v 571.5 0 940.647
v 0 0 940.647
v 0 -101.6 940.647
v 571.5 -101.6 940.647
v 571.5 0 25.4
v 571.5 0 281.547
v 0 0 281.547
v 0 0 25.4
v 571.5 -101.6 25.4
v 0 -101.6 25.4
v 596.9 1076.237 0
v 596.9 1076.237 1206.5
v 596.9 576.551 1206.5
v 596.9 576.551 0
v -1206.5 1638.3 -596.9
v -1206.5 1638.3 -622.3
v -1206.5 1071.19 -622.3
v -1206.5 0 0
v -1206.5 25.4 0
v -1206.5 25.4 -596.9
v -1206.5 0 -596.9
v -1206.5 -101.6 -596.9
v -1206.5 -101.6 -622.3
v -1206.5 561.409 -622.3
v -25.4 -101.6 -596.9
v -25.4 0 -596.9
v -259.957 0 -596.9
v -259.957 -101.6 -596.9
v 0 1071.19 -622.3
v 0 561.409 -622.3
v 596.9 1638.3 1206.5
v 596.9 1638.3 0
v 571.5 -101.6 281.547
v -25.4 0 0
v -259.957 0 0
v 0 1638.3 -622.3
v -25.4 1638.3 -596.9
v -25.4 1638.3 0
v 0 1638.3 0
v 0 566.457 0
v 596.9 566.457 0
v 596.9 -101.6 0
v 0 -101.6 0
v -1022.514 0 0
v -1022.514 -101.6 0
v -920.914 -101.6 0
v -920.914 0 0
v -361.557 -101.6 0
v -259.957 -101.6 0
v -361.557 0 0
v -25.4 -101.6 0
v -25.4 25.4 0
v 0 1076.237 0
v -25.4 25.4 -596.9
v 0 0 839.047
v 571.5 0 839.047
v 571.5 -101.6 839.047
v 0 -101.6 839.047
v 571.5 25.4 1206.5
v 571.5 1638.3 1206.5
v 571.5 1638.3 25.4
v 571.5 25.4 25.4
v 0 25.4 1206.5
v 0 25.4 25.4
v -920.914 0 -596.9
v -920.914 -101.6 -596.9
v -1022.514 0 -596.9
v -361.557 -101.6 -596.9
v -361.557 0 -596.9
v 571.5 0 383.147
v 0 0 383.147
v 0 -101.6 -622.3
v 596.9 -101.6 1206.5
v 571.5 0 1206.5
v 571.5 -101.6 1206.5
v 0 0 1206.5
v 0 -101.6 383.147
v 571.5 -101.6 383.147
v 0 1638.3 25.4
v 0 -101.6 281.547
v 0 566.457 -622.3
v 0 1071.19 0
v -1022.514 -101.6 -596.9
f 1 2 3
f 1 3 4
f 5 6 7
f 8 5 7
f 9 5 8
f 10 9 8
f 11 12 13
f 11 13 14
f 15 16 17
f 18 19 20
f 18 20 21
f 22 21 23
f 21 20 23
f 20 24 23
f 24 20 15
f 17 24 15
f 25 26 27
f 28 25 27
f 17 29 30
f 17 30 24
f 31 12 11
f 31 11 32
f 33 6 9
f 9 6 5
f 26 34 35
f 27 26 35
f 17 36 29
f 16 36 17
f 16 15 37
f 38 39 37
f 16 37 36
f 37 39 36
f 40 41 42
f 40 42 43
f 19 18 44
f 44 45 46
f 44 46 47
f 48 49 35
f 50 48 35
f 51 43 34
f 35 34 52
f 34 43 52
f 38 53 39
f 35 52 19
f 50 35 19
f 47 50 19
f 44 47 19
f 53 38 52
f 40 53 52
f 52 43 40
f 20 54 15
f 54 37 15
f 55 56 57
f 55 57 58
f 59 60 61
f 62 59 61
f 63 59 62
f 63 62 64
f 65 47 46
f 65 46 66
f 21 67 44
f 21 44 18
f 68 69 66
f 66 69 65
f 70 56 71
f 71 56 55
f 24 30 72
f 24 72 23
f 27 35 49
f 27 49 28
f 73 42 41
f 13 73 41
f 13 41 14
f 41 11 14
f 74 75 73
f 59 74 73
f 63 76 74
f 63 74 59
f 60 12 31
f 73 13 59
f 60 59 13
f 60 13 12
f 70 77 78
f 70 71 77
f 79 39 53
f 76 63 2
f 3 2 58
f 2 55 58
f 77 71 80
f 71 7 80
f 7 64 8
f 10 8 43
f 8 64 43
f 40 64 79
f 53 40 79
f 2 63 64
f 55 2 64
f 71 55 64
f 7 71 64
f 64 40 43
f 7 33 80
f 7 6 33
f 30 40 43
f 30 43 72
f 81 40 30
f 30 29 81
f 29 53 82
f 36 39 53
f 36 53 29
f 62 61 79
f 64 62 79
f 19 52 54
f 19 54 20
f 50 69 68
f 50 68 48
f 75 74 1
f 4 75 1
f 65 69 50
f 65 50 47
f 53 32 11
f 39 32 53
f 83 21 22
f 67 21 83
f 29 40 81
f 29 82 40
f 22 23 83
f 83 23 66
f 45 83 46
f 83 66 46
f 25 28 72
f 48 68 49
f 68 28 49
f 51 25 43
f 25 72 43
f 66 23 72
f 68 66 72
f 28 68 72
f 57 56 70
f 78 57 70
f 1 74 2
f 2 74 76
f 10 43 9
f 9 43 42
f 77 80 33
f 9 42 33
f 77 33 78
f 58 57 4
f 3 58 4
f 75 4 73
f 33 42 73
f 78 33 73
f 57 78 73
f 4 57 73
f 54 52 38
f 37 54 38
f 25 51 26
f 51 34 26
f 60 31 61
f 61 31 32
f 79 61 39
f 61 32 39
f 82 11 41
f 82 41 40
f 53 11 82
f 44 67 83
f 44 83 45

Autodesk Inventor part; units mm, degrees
ref_plane "YZ Plane" through (0, 0, 0) normal (1, 0, 0) x (0, 1, 0)
ref_plane "XZ Plane" through (0, 0, 0) normal (0, 1, 0) x (-1, 0, 0)
ref_plane "XY Plane" through (0, 0, 0) normal (0, 0, 1) x (1, 0, 0)
sketch "Sketch1" plane through (0, 0, 0) normal (0, 1, 0) x (-1, 0, 0)
  line L0 (0, 0) -> (1206.5, 0)
  line L1 (1206.5, 0) -> (1206.5, -596.9)
  line L2 (1206.5, -596.9) -> (0, -596.9)
  line L3 (0, -596.9) -> (0, 0)
  line L4 (0, 0) -> (-596.9, 0)
  line L5 (-596.9, 0) -> (-596.9, 1206.5)
  line L6 (-596.9, 1206.5) -> (0, 1206.5)
  line L7 (0, 1206.5) -> (0, 0)
  dimension "d0" = 1206.5
  dimension "d1" = 596.9
  dimension "d2" = 596.9
  dimension "d3" = 1206.5
extrude "Extrusion1" add sketch "Sketch1" along normal blind 25.4
sketch "Sketch2" plane through (0, 0, 0) normal (1, 0, 0) x (0, 1, 0)
  line L0 (0, 0) -> (1638.3, 0)
  line L1 (1638.3, 0) -> (1638.3, -618.6638)
  line L2 (1638.3, -618.6638) -> (0, -618.6638)
  line L3 (0, -618.6638) -> (0, 0)
  dimension "d6" = 1638.3
extrude "Extrusion2" add sketch "Sketch2" against normal blind 25.4
sketch "Sketch3" plane through (596.9, 0, 1206.5) normal (1, 0, 0) x (0, 0, -1)
  line L0 (0, 0) -> (1206.5, 0) projected
  line L1 (1206.5, 0) -> (1206.5, 25.4) projected
  line L2 (0, 25.4) -> (1206.5, 25.4) projected
  line L3 (0, 0) -> (0, 25.4) projected
  line L4 (0, 0) -> (1206.5, 0)
  line L5 (1206.5, 0) -> (1206.5, 1638.3)
  line L6 (1206.5, 1638.3) -> (0, 1638.3)
  line L7 (0, 1638.3) -> (0, 0)
  dimension "d9" = 1638.3
extrude "Extrusion3" add sketch "Sketch3" against normal blind 25.4 contours L7 L6 L5 L2
sketch "Sketch4" plane through (596.9, 0, 0) normal (0, 0, -1) x (-1, 0, 0)
  line L0 (0, 0) -> (596.9, 0) projected
  line L1 (596.9, 0) -> (596.9, 25.4) projected
  line L2 (25.4, 25.4) -> (596.9, 25.4) projected
  line L3 (25.4, 1638.3) -> (25.4, 25.4) projected
  line L4 (0, 1638.3) -> (25.4, 1638.3) projected
  line L5 (0, 0) -> (0, 1638.3) projected
  line L6 (0, 1638.3) -> (596.9, 1638.3)
  line L7 (596.9, 1638.3) -> (596.9, 0)
  line L8 (596.9, 0) -> (0, 0)
  line L9 (0, 0) -> (0, 1638.3)
extrude "Extrusion4" add sketch "Sketch4" against normal blind 25.4 contours L2 L3 L6 L7
sketch "Sketch5" plane through (-1206.5, 0, -596.9) normal (0, 0, -1) x (-1, 0, 0)
  line L0 (-1181.1, 25.4) -> (-1181.1, 0) projected
  line L1 (-1181.1, 0) -> (0, 0) projected
  line L2 (0, 0) -> (0, 25.4) projected
  line L3 (-1181.1, 25.4) -> (0, 25.4) projected
  line L4 (-1206.5, 0) -> (0, 0)
  line L5 (0, 0) -> (0, 1638.3)
  line L6 (0, 1638.3) -> (-1206.5, 1638.3)
  line L7 (-1206.5, 1638.3) -> (-1206.5, 0)
  dimension "d14" = 1638.3
extrude "Extrusion5" add sketch "Sketch5" along normal blind 25.4 contours L0 L4 L7 L6 L5 L3
sketch "Sketch6" plane through (0, 0, 0) normal (0, -1, 0) x (1, 0, 0)
  line L0 (0, 0) -> (0, 1206.5) projected
  line L1 (596.9, 1206.5) -> (596.9, 0) projected
  line L2 (0, 940.6473) -> (596.9, 940.6473)
  line L3 (596.9, 940.6473) -> (596.9, 839.0473)
  line L4 (596.9, 839.0473) -> (0, 839.0473)
  line L5 (0, 839.0473) -> (0, 940.6473)
  line L6 (0, 383.1472) -> (596.9, 383.1472)
  line L7 (596.9, 383.1472) -> (596.9, 281.5472)
  line L8 (596.9, 281.5472) -> (0, 281.5472)
  line L9 (0, 281.5472) -> (0, 383.1472)
  dimension "d17" = 101.6
  dimension "d18" = 101.6
extrude "Extrusion6" add sketch "Sketch6" along normal blind 101.6 contours L0 L6 L1 L8 | L0 L2 L1 L4
sketch "Sketch7" plane through (0, 0, 0) normal (0, -1, 0) x (1, 0, 0)
  line L0 (-1206.5, -596.9) -> (-25.4, -596.9)
  line L1 (-25.4, -596.9) -> (-25.4, -622.3)
  line L2 (-25.4, -622.3) -> (-1206.5, -622.3)
  line L3 (-1206.5, -622.3) -> (-1206.5, -596.9)
extrude "Extrusion7" add sketch "Sketch7" along normal blind 6.35
sketch "Sketch8" plane through (0, 0, 0) normal (0, -1, 0) x (1, 0, 0)
  line L0 (-1206.5, 0) -> (0, 0) projected
  line L1 (-1022.5135, 0) -> (-920.9135, 0)
  line L2 (-920.9135, 0) -> (-920.9135, -622.3)
  line L3 (-920.9135, -622.3) -> (-1022.5135, -622.3)
  line L4 (-1022.5135, -622.3) -> (-1022.5135, 0)
  line L5 (-361.5569, 0) -> (-259.9569, 0)
  line L6 (-259.9569, 0) -> (-259.9569, -622.3)
  line L7 (-259.9569, -622.3) -> (-361.5569, -622.3)
  line L8 (-361.5569, -622.3) -> (-361.5569, 0)
  dimension "d23" = 101.6
  dimension "d24" = 101.6
extrude "Extrusion8" add sketch "Sketch8" along normal blind 101.6
sketch "Sketch9" plane through (596.9, 1638.3, 1206.5) normal (1, 0, 0) x (0, 0, -1)
  line L0 (0, -1638.3) -> (1206.5, -1638.3)
  line L1 (1206.5, -1638.3) -> (1206.5, -1739.9)
  line L2 (1206.5, -1739.9) -> (0, -1739.9)
  line L3 (0, -1739.9) -> (0, -1638.3)
extrude "Extrusion9" add sketch "Sketch9" against normal blind 25.4
sketch "Sketch10" plane through (0, 0, 0) normal (1, 0, 0) x (0, 0, -1)
  line L0 (0, 0) -> (622.3, 0)
  line L1 (622.3, 0) -> (622.3, -101.6)
  line L2 (622.3, -101.6) -> (0, -101.6)
  line L3 (0, -101.6) -> (0, 0)
  dimension "d29" = 101.6
extrude "Extrusion10" add sketch "Sketch10" against normal blind 25.4
sketch "Sketch11" plane through (596.9, 1638.3, 0) normal (0, 0, -1) x (-1, 0, 0)
  line L0 (0, -1739.9) -> (596.9, -1739.9)
  line L1 (596.9, -1739.9) -> (596.9, -1638.3)
  line L2 (596.9, -1638.3) -> (0, -1638.3)
  line L3 (0, -1638.3) -> (0, -1739.9)
extrude "Extrusion11" add sketch "Sketch11" against normal blind 25.4
sketch "Sketch12" plane through (-1206.5, 0, -622.3) normal (0, 0, -1) x (-1, 0, 0)
  line L0 (-1181.1, 25.4) -> (0, 25.4)
  line L1 (0, 25.4) -> (0, -101.6)
  line L2 (0, -101.6) -> (-1181.1, -101.6)
  line L3 (-1181.1, -101.6) -> (-1181.1, 25.4)
  point P0 (-1206.5, 0)
extrude "Extrusion12" add sketch "Sketch12" against normal blind 25.4
sketch "Sketch13" plane through (596.9, 1638.3, 1206.5) normal (1, 0, 0) x (0, 0, -1)
  line L0 (1206.5, -1739.9) -> (1206.5, 0) projected
  line L1 (0, -1739.9) -> (0, 0) projected
  line L2 (0, -562.0627) -> (1206.5, -562.0627)
  line L3 (1206.5, -562.0627) -> (1206.5, -1061.7486)
  line L4 (1206.5, -1061.7486) -> (0, -1061.7486)
  line L5 (0, -1061.7486) -> (0, -562.0627)
  point P0 (1206.5, -1638.3)
sketch "Sketch14" plane through (0, 1638.3, 0) normal (1, 0, 0) x (0, 0, -1)
  line L0 (0, 0) -> (0, -1739.9) projected
  line L1 (622.3, 0) -> (622.3, -1739.9) projected
  line L2 (0, -567.11) -> (622.3, -567.11)
  line L3 (622.3, -567.11) -> (622.3, -1071.8433)
  line L4 (622.3, -1071.8433) -> (0, -1071.8433)
  line L5 (0, -1071.8433) -> (0, -567.11)
  point P0 (0, -1638.3)
sketch "Sketch15" plane through (596.9, 1638.3, 0) normal (0, 0, -1) x (-1, 0, 0)
  line L0 (596.9, 0) -> (596.9, -1739.9) projected
  line L1 (0, -1739.9) -> (0, 0) projected
  line L2 (0, -562.0627) -> (596.9, -562.0627)
  line L3 (596.9, -562.0627) -> (596.9, -1071.8433)
  line L4 (596.9, -1071.8433) -> (0, -1071.8433)
  line L5 (0, -1071.8433) -> (0, -562.0627)
  point P0 (596.9, -1638.3)
sketch "Sketch16" plane through (-1206.5, 0, -622.3) normal (0, 0, -1) x (-1, 0, 0)
  line L0 (0, -101.6) -> (0, 1638.3) projected
  line L1 (-1206.5, 1638.3) -> (-1206.5, -101.6) projected
  line L2 (-1206.5, 1071.19) -> (0, 1071.19)
  line L3 (0, 1071.19) -> (0, 561.4094)
  line L4 (0, 561.4094) -> (-1206.5, 561.4094)
  line L5 (-1206.5, 561.4094) -> (-1206.5, 1071.19)
  point P0 (-1206.5, 0)
extrude "Extrusion13" add sketch "Sketch15" along normal blind 0.0003
extrude "Extrusion14" add sketch "Sketch16" along normal blind 0.0003
extrude "Extrusion15" add sketch "Sketch14" along normal blind 0.0003
extrude "Extrusion16" add sketch "Sketch13" along normal blind 0.0003
properties part number "crate"
